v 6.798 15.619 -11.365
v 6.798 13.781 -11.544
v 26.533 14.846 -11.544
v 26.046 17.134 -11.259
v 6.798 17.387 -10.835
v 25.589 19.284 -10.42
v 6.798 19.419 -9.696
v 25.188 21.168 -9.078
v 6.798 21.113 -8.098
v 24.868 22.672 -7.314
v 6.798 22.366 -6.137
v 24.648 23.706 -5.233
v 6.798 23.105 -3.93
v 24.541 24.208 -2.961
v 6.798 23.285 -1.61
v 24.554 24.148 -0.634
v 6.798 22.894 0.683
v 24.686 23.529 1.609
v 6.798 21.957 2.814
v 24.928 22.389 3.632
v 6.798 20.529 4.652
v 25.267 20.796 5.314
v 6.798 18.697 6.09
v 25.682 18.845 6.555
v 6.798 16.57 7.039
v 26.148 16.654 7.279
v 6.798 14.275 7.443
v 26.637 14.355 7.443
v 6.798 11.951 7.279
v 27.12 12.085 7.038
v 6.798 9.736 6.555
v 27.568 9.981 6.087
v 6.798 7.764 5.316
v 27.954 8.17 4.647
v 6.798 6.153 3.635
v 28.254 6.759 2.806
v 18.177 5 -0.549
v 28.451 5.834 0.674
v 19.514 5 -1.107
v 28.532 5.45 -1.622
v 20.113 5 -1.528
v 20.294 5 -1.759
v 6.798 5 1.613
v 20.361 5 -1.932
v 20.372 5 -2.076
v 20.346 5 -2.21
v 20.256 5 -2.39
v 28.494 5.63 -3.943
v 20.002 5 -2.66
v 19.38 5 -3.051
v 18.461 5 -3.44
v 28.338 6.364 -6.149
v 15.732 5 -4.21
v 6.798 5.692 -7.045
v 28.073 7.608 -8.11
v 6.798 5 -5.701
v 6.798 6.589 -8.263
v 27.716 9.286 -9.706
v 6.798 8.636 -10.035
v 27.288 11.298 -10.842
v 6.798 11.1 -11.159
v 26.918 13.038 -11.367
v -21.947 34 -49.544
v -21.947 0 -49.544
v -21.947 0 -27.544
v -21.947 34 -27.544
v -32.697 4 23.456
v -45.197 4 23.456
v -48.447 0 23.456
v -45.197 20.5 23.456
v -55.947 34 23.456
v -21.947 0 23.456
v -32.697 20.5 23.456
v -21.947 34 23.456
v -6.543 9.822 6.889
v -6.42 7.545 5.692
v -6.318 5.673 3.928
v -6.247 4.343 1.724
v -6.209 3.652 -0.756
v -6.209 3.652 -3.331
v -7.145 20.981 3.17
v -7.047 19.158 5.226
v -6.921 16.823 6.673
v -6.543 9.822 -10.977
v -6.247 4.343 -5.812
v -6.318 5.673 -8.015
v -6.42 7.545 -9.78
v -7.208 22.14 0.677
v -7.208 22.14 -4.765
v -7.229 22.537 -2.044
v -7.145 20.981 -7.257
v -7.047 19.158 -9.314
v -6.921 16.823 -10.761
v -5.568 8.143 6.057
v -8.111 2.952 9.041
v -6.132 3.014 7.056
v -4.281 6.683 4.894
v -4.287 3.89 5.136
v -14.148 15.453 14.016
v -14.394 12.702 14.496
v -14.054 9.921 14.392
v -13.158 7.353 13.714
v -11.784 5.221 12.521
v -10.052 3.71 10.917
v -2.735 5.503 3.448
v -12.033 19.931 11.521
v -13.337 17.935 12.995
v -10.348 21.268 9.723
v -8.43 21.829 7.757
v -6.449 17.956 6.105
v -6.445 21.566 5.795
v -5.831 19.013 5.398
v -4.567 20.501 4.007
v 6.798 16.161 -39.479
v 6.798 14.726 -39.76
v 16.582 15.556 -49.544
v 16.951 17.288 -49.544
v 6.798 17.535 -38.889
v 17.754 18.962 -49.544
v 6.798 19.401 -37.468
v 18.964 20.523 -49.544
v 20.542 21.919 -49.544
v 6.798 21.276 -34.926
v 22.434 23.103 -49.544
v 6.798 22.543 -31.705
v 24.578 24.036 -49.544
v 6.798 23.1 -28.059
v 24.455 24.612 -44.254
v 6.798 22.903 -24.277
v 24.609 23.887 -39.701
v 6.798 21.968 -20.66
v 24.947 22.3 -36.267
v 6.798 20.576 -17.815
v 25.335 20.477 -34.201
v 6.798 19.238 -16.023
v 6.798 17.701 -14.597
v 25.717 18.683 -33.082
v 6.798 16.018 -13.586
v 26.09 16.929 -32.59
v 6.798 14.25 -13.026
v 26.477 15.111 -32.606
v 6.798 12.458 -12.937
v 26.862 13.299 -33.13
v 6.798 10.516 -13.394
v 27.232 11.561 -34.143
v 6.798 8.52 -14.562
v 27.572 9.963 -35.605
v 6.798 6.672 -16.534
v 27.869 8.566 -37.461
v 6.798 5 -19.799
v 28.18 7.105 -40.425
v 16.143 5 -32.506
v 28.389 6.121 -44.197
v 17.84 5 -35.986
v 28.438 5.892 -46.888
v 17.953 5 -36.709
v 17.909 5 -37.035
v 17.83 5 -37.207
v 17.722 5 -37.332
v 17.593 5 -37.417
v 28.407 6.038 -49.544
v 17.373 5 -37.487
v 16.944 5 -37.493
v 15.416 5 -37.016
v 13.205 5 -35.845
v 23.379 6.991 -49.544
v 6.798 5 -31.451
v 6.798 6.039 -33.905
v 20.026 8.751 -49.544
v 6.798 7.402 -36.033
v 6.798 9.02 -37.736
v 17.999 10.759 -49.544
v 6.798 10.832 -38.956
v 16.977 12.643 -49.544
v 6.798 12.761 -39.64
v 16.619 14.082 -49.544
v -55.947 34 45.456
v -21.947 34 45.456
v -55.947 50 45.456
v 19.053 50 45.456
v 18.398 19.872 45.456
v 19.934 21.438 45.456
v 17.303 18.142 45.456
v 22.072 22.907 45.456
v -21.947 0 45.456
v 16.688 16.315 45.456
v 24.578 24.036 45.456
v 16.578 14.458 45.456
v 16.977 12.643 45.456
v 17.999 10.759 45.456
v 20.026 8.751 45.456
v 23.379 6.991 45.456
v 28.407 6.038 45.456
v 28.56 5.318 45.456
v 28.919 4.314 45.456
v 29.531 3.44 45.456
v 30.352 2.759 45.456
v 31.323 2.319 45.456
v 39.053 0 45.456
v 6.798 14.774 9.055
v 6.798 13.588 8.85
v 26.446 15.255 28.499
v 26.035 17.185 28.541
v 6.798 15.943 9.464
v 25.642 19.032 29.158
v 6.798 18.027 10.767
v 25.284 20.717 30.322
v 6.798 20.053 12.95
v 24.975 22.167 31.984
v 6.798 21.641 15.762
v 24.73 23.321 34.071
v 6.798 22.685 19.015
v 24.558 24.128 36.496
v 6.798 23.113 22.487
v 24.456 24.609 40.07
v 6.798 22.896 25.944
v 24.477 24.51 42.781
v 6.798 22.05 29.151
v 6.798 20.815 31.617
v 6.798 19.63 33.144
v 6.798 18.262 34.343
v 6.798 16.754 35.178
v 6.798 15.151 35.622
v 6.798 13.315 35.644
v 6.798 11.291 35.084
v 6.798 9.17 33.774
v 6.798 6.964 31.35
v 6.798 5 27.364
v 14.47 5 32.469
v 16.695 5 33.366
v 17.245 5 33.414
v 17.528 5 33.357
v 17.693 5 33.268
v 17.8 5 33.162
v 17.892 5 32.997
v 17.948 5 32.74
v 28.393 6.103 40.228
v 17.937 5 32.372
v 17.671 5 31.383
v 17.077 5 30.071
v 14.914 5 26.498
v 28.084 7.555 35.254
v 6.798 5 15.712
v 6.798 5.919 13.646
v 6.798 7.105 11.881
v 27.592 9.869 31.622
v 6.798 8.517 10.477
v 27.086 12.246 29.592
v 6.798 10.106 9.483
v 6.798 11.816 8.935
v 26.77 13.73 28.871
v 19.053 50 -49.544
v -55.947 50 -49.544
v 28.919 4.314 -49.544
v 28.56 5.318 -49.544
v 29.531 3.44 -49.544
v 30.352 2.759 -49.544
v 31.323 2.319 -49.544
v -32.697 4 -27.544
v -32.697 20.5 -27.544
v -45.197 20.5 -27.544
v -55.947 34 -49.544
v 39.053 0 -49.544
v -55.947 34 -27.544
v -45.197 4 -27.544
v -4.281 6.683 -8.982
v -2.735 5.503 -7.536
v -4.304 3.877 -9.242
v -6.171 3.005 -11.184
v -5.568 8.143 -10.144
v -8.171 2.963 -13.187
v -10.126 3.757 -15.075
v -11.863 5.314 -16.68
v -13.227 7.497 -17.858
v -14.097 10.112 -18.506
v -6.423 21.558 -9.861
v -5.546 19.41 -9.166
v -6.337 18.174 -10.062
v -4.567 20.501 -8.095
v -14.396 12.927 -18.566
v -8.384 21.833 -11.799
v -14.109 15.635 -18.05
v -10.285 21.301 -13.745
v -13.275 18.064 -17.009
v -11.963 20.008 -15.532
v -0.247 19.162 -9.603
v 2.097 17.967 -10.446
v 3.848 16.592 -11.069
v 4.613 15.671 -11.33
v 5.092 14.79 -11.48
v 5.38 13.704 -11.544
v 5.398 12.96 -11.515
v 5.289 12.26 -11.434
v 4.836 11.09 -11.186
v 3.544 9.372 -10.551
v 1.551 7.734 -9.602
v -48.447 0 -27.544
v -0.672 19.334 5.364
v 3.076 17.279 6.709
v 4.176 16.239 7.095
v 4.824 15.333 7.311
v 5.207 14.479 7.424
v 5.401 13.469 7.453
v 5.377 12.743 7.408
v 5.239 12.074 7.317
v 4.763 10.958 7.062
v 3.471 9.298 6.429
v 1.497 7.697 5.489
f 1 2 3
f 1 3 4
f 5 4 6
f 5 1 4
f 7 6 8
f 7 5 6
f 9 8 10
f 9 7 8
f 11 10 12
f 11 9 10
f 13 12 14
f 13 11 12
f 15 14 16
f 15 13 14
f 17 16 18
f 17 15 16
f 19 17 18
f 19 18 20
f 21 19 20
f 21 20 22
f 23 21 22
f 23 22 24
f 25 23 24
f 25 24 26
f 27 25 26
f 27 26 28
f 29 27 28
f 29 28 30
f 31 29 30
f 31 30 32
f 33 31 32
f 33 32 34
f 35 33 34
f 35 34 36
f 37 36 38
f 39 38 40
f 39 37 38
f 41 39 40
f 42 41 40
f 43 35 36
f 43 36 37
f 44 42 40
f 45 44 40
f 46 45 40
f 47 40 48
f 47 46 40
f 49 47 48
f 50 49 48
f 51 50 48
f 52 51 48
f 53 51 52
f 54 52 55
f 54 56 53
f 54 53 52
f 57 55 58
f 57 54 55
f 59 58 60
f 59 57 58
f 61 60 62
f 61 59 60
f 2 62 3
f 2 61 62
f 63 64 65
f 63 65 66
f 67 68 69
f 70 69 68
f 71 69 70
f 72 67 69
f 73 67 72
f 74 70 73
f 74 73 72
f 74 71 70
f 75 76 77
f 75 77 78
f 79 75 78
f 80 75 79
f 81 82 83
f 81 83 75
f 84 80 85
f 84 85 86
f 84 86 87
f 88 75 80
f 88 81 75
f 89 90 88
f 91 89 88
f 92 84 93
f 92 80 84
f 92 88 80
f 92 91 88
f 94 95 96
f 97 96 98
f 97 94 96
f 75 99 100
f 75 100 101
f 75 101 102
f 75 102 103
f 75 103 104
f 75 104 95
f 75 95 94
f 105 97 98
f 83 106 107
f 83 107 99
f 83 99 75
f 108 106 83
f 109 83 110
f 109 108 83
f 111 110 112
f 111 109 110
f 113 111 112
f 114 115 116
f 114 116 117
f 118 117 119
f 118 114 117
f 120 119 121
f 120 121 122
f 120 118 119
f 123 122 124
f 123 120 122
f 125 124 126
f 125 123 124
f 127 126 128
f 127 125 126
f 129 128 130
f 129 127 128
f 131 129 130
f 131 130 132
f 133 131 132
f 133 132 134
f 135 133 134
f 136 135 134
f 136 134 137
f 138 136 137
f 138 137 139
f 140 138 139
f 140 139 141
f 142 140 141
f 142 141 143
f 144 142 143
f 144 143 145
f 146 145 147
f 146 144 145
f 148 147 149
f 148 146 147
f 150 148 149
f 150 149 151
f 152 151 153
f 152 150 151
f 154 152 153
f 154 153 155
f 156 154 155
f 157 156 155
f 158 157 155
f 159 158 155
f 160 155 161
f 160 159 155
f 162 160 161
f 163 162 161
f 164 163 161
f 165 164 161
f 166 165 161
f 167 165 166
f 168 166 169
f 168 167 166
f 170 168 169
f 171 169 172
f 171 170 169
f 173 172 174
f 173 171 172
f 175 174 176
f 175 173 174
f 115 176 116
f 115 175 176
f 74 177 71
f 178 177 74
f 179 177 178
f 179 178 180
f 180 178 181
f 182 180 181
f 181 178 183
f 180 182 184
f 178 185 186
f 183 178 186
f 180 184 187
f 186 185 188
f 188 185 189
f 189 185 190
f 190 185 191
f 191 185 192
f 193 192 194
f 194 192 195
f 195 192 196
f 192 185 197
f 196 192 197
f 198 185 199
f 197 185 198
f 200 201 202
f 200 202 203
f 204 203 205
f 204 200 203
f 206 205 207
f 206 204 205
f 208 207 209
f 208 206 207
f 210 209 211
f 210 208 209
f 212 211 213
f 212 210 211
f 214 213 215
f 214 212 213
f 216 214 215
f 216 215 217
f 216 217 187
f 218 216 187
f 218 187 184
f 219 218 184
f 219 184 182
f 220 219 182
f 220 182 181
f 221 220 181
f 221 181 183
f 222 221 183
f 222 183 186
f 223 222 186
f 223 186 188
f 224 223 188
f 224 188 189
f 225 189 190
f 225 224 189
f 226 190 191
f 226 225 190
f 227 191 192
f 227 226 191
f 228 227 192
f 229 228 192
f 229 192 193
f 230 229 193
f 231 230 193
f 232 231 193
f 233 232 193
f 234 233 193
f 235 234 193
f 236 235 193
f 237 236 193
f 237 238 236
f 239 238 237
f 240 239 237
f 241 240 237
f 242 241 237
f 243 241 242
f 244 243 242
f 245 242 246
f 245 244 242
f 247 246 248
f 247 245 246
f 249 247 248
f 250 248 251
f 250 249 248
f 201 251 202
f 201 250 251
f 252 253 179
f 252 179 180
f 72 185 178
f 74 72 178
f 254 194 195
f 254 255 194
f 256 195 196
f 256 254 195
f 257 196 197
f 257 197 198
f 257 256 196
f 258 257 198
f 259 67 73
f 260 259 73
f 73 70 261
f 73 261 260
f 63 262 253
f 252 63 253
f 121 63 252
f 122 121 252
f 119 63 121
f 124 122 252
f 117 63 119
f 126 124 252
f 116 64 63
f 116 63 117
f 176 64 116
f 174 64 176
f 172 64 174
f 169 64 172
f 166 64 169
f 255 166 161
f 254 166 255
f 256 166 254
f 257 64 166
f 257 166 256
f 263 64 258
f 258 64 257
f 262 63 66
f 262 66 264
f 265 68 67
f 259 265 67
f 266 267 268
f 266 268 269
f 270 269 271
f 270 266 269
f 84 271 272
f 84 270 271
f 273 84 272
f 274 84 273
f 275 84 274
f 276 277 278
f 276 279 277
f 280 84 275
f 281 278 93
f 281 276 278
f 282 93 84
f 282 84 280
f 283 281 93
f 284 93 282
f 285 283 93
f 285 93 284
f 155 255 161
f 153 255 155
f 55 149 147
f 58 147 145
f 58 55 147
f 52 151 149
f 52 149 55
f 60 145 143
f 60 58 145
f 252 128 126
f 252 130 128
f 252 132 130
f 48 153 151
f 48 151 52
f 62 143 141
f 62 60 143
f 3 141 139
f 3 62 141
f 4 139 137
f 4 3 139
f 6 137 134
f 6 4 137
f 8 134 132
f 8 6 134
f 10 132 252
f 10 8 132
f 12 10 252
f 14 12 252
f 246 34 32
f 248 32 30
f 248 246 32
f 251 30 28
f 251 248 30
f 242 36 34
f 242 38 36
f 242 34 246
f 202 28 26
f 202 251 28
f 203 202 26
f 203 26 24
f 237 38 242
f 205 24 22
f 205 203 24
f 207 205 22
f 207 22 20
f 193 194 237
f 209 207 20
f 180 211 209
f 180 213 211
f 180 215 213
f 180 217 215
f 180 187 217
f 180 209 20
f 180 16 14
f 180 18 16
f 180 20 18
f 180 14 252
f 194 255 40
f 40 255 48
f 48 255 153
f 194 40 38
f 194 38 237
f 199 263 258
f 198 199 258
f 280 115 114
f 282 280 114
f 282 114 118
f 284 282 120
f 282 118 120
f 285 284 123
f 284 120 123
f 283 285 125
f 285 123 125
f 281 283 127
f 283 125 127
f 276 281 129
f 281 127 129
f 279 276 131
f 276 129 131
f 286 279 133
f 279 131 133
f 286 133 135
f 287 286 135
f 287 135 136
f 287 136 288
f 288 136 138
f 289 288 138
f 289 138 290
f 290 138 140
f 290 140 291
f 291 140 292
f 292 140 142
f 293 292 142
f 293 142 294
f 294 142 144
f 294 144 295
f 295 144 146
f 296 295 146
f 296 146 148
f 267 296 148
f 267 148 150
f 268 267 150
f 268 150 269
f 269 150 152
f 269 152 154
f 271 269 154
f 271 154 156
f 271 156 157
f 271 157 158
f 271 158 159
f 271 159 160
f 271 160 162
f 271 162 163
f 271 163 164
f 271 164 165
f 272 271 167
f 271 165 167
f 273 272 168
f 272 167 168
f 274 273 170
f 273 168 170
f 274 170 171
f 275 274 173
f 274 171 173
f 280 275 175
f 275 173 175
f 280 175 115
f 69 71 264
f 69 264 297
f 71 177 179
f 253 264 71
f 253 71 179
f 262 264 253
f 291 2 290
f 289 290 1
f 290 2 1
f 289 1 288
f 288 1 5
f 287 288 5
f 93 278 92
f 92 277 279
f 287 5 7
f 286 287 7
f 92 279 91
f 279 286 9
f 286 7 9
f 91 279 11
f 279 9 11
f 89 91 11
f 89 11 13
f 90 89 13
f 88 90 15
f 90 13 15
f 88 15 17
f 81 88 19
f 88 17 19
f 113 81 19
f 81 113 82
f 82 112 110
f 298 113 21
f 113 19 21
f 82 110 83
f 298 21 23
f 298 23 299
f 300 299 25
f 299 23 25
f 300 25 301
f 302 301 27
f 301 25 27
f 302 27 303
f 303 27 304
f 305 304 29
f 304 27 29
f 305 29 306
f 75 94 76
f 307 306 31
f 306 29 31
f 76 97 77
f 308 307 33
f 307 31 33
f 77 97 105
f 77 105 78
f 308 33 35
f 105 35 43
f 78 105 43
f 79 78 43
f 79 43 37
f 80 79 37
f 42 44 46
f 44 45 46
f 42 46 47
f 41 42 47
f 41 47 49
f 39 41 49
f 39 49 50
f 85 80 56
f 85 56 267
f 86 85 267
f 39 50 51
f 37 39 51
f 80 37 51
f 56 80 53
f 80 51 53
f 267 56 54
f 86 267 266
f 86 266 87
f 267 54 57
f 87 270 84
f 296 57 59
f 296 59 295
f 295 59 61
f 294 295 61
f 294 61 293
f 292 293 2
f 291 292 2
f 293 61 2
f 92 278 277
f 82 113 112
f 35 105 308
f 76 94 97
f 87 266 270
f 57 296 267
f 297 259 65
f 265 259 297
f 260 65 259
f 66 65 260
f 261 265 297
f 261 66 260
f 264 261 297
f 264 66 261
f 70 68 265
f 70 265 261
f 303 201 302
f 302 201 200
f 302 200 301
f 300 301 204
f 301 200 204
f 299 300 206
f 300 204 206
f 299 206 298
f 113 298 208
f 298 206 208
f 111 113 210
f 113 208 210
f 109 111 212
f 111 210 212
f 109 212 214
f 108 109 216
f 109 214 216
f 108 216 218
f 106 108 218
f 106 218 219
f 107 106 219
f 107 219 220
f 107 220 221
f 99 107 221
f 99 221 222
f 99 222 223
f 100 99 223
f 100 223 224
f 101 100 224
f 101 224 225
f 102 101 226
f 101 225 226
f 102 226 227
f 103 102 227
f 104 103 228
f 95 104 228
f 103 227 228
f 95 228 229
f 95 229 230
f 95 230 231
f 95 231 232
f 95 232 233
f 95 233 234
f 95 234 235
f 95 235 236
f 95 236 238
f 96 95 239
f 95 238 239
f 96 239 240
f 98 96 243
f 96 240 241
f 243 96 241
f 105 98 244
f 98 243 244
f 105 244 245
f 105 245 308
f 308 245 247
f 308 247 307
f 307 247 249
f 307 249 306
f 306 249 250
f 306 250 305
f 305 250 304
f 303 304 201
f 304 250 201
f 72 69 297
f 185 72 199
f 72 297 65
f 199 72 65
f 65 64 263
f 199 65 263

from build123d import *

# Parameters (mm, degrees)
SKETCH1_W           = 95
SKETCH1_H           = 95
BOSS_EXTRUDE1_DEPTH = 50
CUT_EXTRUDE1_DEPTH  = 100
SKETCH3_R           = 9.5
CUT_EXTRUDE2_DEPTH  = 45
CUT_EXTRUDE4_DEPTH  = 45
CUT_EXTRUDE5_DEPTH  = 45
CUT_EXTRUDE6_DEPTH  = 45
CUT_EXTRUDE7_DEPTH  = 45
SKETCH9_R           = 9.5
CUT_EXTRUDE9_DEPTH  = 45
SKETCH11_R          = 9.5
CUT_EXTRUDE10_DEPTH = 45
SKETCH12_W          = 31.985759797
SKETCH12_H          = 95
BOSS_EXTRUDE2_DEPTH = 45
CUT_EXTRUDE11_DEPTH = 100
SKETCH14_R          = 9.5
CUT_EXTRUDE12_DEPTH = 100
SKETCH15_R          = 9.5
CUT_EXTRUDE13_DEPTH = 100
SKETCH16_R          = 9.5
CUT_EXTRUDE14_DEPTH = 100
FILLET2_R           = 4
SKETCH17_W          = 34
SKETCH17_H          = 34
CUT_EXTRUDE16_DEPTH = 22
SKETCH19_W          = 34
SKETCH19_H          = 34
CUT_EXTRUDE17_DEPTH = 22
SKETCH20_W          = 12.5
SKETCH20_H          = 16.5
CUT_EXTRUDE18_DEPTH = 60
CUT_EXTRUDE19_DEPTH = 60


with BuildPart() as part:
    # Sketch1 → Boss-Extrude1 (new body)
    with BuildSketch(Plane(origin=(0, 0, 0), x_dir=(1, 0, 0), z_dir=(0, 1, 0))):
        with Locations((-8.446550514, 2.043801884)):
            Rectangle(SKETCH1_W, SKETCH1_H)
    extrude(amount=BOSS_EXTRUDE1_DEPTH)

    # Sketch2 → Cut-Extrude1 (cut)
    with BuildSketch(Plane.XY.offset(45.456198116)):
        Polygon((39.053449486, 0), (36.353449486, 50), (39.053449486, 50), align=None)
    extrude(amount=-CUT_EXTRUDE1_DEPTH, mode=Mode.SUBTRACT)

    # Sketch3 → Cut-Extrude2 (cut)
    with BuildSketch(Plane(origin=(38.939900735, 2.10275464, 0), x_dir=(0, 0, -1), z_dir=(0.998545181, 0.05392144, 0))):
        with Locations((2.043801884, 13.394181776)):
            Circle(SKETCH3_R)
    extrude(amount=-CUT_EXTRUDE2_DEPTH, mode=Mode.SUBTRACT)

    # Sketch5 → Cut-Extrude4 (cut)
    with BuildSketch(Plane(origin=(0, 50, 0), x_dir=(1, 0, 0), z_dir=(0, 1, 0))):
        Polygon((39.053449486, 49.543801884), (39.053449486, 29.543801884), (19.053449486, 49.543801884), align=None)
        Polygon((39.053449486, -45.456198116), (39.053449486, -25.456198116), (19.053449486, -45.456198116), align=None)
    extrude(amount=-CUT_EXTRUDE4_DEPTH, mode=Mode.SUBTRACT)

    # Sketch6 → Cut-Extrude5 (cut)
    with BuildSketch(Plane(origin=(0, 50, 0), x_dir=(1, 0, 0), z_dir=(0, 1, 0))):
        Polygon((19.053449486, -45.456198116), (12.925569587, -39.328318218), (6.797689689, -45.456198116), align=None)
        Polygon((19.053449486, 49.543801884), (12.925569587, 43.415921985), (6.797689689, 49.543801884), align=None)
    extrude(amount=-CUT_EXTRUDE5_DEPTH, mode=Mode.SUBTRACT)

    # Sketch7 → Cut-Extrude6 (cut)
    with BuildSketch(Plane(origin=(-13.201374315, 0, 13.201374315), x_dir=(0.707106781, 0, 0.707106781), z_dir=(-0.707106781, 0, 0.707106781))):
        Polygon((45.615209271, 5), (42.915209271, 50), (45.615209271, 50), align=None)
    extrude(amount=-CUT_EXTRUDE6_DEPTH, mode=Mode.SUBTRACT)

    # Sketch8 → Cut-Extrude7 (cut)
    with BuildSketch(Plane(origin=(-15.245176199, 0, -15.245176199), x_dir=(-0.707106781, 0, 0.707106781), z_dir=(-0.707106781, 0, -0.707106781))):
        Polygon((-48.505581614, 5), (-45.805581614, 50), (-48.505581614, 50), align=None)
    extrude(amount=-CUT_EXTRUDE7_DEPTH, mode=Mode.SUBTRACT)

    # Sketch9 → Cut-Extrude9 (cut)
    with BuildSketch(Plane(origin=(34.386964646, 2.917830706, -34.386964646), x_dir=(-0.708373873, 0.059677836, -0.70331004), z_dir=(0.705837415, 0.059892291, -0.705837415))):
        with Locations((14.526974541, 11.311121921)):
            Circle(SKETCH9_R)
    extrude(amount=-CUT_EXTRUDE9_DEPTH, mode=Mode.SUBTRACT)

    # Sketch11 → Cut-Extrude10 (cut)
    with BuildSketch(Plane(origin=(32.350494057, 2.745030447, 32.350494057), x_dir=(0.70331004, 0.059677836, -0.708373873), z_dir=(0.705837415, 0.059892291, 0.705837415))):
        with Locations((-10.17752107, 12.964151979)):
            Circle(SKETCH11_R)
    extrude(amount=-CUT_EXTRUDE10_DEPTH, mode=Mode.SUBTRACT)

    # Sketch12 → Boss-Extrude2 (add)
    with BuildSketch(Plane(origin=(0, 5, 0), x_dir=(1, 0, 0), z_dir=(0, 1, 0))):
        with Locations((22.790569588, 2.043801884)):
            Rectangle(SKETCH12_W, SKETCH12_H)
    extrude(amount=BOSS_EXTRUDE2_DEPTH)

    # Sketch13 → Cut-Extrude11 (cut)
    with BuildSketch(Plane.XY.offset(45.456198116)):
        Polygon((39.053449486, 0), (29.053449486, 3), (19.053449486, 50), (49.745275601, 50), align=None)
    extrude(amount=-CUT_EXTRUDE11_DEPTH, mode=Mode.SUBTRACT)

    # Sketch14 → Cut-Extrude12 (cut)
    with BuildSketch(Plane(origin=(-5.994632406, -0.32371015, 0), x_dir=(0, 0, -1), z_dir=(0.998545181, 0.05392144, 0))):
        with Locations((2.043801884, 13.394181776)):
            Circle(SKETCH14_R)
    extrude(amount=CUT_EXTRUDE12_DEPTH, mode=Mode.SUBTRACT)

    # Sketch15 → Cut-Extrude13 (cut)
    with BuildSketch(Plane(origin=(0.587810371, 0.049877364, 0.587810371), x_dir=(0.70331004, 0.059677836, -0.708373873), z_dir=(0.705837415, 0.059892291, 0.705837415))):
        with Locations((-10.17752107, 12.964151979)):
            Circle(SKETCH15_R)
    extrude(amount=CUT_EXTRUDE13_DEPTH, mode=Mode.SUBTRACT)

    # Sketch16 → Cut-Extrude14 (cut)
    with BuildSketch(Plane(origin=(2.62428096, 0.222677624, -2.62428096), x_dir=(-0.708373873, 0.059677836, -0.70331004), z_dir=(0.705837415, 0.059892291, -0.705837415))):
        with Locations((14.526974541, 11.311121921)):
            Circle(SKETCH16_R)
    extrude(amount=CUT_EXTRUDE14_DEPTH, mode=Mode.SUBTRACT)

    # Fillet2
    fillet2_edges = [part.edges().sort_by_distance(p)[0] for p in [
        (29.053449486, 3, -2.043801884),
    ]]
    fillet(fillet2_edges, radius=FILLET2_R)

    # Sketch17 → Cut-Extrude16 (cut)
    with BuildSketch(Plane.XY.offset(45.456198116)):
        with Locations((-38.946550514, 17)):
            Rectangle(SKETCH17_W, SKETCH17_H)
    extrude(amount=-CUT_EXTRUDE16_DEPTH, mode=Mode.SUBTRACT)

    # Sketch19 → Cut-Extrude17 (cut)
    with BuildSketch(Plane(origin=(0, 0, -49.543801884), x_dir=(-1, 0, 0), z_dir=(0, 0, -1))):
        with Locations((38.946550514, 17)):
            Rectangle(SKETCH19_W, SKETCH19_H)
    extrude(amount=-CUT_EXTRUDE17_DEPTH, mode=Mode.SUBTRACT)

    # Sketch20 → Cut-Extrude18 (cut)
    with BuildSketch(Plane.XY.offset(23.456198116)):
        with Locations((-38.946550514, 12.25)):
            Rectangle(SKETCH20_W, SKETCH20_H)
    extrude(amount=-CUT_EXTRUDE18_DEPTH, mode=Mode.SUBTRACT)

    # Sketch21 → Cut-Extrude19 (cut)
    with BuildSketch(Plane.XY.offset(23.456198116)):
        Polygon((-55.946550514, 34), (-48.446550514, 0), (-55.946550514, 0), align=None)
    extrude(amount=-CUT_EXTRUDE19_DEPTH, mode=Mode.SUBTRACT)


solid = part.part
